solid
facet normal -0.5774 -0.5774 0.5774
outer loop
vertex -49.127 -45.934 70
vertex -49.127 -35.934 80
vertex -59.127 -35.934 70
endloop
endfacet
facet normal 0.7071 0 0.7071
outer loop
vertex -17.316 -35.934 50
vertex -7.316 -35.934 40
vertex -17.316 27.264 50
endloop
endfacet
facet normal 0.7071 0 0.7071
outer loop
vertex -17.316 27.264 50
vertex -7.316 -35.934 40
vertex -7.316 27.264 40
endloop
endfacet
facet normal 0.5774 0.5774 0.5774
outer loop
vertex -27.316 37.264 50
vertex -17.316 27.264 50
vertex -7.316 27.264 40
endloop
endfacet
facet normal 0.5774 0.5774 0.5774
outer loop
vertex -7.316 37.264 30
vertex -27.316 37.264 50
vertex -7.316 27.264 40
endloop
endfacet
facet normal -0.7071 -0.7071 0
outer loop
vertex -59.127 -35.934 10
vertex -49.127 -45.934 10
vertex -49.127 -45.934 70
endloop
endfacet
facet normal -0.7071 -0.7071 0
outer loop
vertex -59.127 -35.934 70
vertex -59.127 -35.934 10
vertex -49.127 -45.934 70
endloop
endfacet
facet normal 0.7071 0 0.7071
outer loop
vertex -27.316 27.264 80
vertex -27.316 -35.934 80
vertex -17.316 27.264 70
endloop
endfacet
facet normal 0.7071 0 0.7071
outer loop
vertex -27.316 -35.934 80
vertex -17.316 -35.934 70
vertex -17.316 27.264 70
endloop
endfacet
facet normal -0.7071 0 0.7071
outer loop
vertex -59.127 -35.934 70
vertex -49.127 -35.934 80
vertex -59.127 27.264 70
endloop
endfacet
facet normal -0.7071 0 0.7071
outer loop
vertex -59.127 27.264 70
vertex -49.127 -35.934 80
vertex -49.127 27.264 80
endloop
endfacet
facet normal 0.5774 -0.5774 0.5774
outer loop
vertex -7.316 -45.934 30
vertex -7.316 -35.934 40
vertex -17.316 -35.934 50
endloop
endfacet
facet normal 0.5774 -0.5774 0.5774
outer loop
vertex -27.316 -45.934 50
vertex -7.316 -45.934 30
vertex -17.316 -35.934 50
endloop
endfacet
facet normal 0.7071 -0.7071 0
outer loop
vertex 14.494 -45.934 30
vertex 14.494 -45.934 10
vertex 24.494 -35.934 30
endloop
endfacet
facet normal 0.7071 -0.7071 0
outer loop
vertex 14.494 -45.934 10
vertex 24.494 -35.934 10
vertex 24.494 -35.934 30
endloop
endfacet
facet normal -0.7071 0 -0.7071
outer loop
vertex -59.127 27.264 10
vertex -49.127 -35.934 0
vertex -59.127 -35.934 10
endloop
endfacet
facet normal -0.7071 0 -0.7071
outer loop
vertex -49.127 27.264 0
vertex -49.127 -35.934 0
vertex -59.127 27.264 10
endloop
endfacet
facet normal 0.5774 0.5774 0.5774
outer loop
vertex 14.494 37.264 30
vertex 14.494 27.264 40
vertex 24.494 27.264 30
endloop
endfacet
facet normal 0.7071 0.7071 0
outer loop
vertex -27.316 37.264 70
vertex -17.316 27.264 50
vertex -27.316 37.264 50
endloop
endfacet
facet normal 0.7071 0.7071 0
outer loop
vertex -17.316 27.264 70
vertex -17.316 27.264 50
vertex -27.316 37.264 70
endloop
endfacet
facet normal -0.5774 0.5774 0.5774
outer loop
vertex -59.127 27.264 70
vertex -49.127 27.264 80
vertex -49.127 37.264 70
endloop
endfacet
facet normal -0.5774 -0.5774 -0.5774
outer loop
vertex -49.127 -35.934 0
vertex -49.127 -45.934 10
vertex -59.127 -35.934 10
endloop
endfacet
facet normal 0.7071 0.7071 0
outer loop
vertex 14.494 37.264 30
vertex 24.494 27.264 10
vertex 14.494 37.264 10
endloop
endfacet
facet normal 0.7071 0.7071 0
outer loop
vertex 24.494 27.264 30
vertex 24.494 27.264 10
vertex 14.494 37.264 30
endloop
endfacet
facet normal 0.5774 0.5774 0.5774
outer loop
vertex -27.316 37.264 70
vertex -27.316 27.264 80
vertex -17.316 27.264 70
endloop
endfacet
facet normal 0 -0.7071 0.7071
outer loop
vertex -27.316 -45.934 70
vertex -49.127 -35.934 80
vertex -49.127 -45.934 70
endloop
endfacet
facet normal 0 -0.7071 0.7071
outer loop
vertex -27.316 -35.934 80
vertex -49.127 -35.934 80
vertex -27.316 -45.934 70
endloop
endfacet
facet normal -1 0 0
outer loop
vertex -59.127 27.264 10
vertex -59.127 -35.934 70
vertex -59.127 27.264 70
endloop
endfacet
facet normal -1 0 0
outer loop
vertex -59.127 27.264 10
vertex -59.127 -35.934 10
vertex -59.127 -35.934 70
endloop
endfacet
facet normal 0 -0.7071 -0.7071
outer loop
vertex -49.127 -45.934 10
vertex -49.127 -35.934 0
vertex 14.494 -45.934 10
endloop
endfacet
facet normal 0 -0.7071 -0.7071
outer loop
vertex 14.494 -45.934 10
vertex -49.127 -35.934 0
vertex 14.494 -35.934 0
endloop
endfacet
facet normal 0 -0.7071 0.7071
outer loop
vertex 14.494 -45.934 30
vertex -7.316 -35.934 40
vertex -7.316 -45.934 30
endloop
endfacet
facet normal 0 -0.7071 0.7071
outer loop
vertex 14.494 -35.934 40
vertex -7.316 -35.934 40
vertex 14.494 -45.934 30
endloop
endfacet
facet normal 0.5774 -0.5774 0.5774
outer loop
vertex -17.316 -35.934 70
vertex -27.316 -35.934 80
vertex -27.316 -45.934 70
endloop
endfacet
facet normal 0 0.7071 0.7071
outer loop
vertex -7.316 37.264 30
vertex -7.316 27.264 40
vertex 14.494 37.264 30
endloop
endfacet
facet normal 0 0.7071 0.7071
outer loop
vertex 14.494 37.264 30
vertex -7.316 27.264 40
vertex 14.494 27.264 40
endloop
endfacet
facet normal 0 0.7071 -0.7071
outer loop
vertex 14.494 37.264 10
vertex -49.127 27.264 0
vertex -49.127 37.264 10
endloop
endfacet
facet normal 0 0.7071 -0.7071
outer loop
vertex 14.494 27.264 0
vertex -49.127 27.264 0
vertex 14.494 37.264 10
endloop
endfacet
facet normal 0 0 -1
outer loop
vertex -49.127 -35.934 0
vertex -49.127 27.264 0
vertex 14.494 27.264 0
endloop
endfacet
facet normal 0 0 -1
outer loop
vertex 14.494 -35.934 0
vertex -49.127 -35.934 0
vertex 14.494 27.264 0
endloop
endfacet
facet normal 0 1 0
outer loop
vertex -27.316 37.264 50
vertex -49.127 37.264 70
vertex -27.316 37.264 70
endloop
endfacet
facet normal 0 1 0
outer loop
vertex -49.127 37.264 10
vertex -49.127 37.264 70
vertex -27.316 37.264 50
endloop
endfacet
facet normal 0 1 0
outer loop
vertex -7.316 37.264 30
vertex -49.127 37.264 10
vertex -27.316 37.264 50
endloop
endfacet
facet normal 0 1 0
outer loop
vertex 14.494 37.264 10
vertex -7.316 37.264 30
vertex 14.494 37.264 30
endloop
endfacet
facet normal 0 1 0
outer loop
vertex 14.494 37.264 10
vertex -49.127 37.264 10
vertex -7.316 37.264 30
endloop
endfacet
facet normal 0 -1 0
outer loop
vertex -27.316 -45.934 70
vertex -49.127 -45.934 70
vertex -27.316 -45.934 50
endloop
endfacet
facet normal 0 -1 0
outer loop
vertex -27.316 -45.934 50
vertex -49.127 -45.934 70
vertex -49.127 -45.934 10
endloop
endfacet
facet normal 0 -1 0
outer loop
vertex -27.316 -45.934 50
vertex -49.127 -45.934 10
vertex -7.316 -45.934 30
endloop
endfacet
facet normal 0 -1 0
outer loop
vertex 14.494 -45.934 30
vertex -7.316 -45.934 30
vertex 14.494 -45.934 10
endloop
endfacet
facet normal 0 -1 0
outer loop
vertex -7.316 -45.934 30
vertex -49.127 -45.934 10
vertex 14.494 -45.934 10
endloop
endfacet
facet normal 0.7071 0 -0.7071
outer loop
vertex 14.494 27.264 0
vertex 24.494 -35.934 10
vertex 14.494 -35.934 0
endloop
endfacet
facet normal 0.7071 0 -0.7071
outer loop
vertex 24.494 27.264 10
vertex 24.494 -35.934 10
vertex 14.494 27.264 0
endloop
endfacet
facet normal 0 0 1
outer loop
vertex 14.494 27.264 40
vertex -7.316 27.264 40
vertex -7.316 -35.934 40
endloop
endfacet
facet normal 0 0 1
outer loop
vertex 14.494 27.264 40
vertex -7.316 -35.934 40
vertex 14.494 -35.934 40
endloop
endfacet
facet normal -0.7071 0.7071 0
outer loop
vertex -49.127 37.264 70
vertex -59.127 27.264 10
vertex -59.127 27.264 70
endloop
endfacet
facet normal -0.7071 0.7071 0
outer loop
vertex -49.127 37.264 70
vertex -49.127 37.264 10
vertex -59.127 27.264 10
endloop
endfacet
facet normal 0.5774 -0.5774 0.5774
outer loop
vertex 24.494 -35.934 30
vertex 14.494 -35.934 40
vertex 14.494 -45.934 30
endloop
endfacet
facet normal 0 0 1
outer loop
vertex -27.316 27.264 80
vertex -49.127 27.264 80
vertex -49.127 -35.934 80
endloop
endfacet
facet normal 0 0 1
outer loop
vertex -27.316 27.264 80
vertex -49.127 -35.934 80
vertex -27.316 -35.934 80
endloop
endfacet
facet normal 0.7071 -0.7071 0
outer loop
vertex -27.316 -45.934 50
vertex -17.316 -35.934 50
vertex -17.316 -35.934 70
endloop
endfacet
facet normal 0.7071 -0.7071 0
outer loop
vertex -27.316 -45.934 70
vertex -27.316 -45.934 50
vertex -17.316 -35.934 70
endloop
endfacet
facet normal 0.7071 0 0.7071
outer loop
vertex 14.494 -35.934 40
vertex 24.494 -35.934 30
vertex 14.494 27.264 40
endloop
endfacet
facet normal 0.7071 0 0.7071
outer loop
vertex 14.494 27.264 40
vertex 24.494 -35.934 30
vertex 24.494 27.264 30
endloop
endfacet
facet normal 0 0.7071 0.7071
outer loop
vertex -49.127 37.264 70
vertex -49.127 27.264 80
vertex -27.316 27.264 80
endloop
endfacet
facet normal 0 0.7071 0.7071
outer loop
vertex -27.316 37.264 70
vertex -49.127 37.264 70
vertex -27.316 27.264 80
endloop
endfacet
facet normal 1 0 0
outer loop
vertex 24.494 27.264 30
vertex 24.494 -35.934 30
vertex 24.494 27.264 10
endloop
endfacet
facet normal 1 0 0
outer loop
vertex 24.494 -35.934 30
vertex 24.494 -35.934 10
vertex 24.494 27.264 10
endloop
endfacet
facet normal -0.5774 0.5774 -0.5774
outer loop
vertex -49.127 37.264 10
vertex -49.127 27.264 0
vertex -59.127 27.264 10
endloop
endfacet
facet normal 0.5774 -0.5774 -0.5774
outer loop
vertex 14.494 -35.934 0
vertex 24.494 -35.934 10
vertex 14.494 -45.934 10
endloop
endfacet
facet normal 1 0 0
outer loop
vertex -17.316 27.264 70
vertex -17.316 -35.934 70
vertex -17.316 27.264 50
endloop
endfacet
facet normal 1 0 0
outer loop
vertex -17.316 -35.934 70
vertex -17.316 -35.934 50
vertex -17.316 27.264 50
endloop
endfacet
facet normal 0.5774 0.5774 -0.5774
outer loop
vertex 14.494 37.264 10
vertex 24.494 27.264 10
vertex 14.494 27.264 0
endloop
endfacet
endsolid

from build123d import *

# Parameters (mm, degrees)
F0_W     = 83.6216490716
F0_H     = 83.1985995173
F1_DEPTH = 40
F2_W     = 41.8108245358
F2_H     = 83.1985995173
F3_DEPTH = 40
F4_SIZE  = 10


with BuildPart() as f1:
    # F0 (on Top) → F1 (new body)
    with BuildSketch(Plane.XY):
        with Locations((-17.3164242879, -4.335001111)):
            Rectangle(F0_W, F0_H)
    extrude(amount=F1_DEPTH)

    # F2 (on face) → F3 (join)
    with BuildSketch(Plane.XY.offset(40)):
        with Locations((-38.2218365557, -4.335001111)):
            Rectangle(F2_W, F2_H)
    extrude(amount=F3_DEPTH)

    # F4
    f4_edges = [f1.edges().sort_by_distance(p)[0] for p in [
        (-17.316424, -4.335001, 80),
        (-38.221837, -45.934301, 80),
        (-59.127249, -4.335001, 80),
        (-38.221837, 37.264299, 80),
        (-17.316424, -45.934301, 60),
        (-17.316424, -4.335001, 40),
        (-17.316424, 37.264299, 60),
        (3.588988, 37.264299, 40),
        (3.588988, -45.934301, 40),
        (24.4944, -4.335001, 40),
        (24.4944, -45.934301, 20),
        (24.4944, 37.264299, 20),
        (24.4944, -4.335001, 0),
        (-17.316424, -45.934301, 0),
        (-59.127249, -45.934301, 40),
        (-59.127249, -4.335001, 0),
        (-17.316424, 37.264299, 0),
        (-59.127249, 37.264299, 40),
    ]]
    chamfer(f4_edges, length=F4_SIZE)


solid = f1.part
